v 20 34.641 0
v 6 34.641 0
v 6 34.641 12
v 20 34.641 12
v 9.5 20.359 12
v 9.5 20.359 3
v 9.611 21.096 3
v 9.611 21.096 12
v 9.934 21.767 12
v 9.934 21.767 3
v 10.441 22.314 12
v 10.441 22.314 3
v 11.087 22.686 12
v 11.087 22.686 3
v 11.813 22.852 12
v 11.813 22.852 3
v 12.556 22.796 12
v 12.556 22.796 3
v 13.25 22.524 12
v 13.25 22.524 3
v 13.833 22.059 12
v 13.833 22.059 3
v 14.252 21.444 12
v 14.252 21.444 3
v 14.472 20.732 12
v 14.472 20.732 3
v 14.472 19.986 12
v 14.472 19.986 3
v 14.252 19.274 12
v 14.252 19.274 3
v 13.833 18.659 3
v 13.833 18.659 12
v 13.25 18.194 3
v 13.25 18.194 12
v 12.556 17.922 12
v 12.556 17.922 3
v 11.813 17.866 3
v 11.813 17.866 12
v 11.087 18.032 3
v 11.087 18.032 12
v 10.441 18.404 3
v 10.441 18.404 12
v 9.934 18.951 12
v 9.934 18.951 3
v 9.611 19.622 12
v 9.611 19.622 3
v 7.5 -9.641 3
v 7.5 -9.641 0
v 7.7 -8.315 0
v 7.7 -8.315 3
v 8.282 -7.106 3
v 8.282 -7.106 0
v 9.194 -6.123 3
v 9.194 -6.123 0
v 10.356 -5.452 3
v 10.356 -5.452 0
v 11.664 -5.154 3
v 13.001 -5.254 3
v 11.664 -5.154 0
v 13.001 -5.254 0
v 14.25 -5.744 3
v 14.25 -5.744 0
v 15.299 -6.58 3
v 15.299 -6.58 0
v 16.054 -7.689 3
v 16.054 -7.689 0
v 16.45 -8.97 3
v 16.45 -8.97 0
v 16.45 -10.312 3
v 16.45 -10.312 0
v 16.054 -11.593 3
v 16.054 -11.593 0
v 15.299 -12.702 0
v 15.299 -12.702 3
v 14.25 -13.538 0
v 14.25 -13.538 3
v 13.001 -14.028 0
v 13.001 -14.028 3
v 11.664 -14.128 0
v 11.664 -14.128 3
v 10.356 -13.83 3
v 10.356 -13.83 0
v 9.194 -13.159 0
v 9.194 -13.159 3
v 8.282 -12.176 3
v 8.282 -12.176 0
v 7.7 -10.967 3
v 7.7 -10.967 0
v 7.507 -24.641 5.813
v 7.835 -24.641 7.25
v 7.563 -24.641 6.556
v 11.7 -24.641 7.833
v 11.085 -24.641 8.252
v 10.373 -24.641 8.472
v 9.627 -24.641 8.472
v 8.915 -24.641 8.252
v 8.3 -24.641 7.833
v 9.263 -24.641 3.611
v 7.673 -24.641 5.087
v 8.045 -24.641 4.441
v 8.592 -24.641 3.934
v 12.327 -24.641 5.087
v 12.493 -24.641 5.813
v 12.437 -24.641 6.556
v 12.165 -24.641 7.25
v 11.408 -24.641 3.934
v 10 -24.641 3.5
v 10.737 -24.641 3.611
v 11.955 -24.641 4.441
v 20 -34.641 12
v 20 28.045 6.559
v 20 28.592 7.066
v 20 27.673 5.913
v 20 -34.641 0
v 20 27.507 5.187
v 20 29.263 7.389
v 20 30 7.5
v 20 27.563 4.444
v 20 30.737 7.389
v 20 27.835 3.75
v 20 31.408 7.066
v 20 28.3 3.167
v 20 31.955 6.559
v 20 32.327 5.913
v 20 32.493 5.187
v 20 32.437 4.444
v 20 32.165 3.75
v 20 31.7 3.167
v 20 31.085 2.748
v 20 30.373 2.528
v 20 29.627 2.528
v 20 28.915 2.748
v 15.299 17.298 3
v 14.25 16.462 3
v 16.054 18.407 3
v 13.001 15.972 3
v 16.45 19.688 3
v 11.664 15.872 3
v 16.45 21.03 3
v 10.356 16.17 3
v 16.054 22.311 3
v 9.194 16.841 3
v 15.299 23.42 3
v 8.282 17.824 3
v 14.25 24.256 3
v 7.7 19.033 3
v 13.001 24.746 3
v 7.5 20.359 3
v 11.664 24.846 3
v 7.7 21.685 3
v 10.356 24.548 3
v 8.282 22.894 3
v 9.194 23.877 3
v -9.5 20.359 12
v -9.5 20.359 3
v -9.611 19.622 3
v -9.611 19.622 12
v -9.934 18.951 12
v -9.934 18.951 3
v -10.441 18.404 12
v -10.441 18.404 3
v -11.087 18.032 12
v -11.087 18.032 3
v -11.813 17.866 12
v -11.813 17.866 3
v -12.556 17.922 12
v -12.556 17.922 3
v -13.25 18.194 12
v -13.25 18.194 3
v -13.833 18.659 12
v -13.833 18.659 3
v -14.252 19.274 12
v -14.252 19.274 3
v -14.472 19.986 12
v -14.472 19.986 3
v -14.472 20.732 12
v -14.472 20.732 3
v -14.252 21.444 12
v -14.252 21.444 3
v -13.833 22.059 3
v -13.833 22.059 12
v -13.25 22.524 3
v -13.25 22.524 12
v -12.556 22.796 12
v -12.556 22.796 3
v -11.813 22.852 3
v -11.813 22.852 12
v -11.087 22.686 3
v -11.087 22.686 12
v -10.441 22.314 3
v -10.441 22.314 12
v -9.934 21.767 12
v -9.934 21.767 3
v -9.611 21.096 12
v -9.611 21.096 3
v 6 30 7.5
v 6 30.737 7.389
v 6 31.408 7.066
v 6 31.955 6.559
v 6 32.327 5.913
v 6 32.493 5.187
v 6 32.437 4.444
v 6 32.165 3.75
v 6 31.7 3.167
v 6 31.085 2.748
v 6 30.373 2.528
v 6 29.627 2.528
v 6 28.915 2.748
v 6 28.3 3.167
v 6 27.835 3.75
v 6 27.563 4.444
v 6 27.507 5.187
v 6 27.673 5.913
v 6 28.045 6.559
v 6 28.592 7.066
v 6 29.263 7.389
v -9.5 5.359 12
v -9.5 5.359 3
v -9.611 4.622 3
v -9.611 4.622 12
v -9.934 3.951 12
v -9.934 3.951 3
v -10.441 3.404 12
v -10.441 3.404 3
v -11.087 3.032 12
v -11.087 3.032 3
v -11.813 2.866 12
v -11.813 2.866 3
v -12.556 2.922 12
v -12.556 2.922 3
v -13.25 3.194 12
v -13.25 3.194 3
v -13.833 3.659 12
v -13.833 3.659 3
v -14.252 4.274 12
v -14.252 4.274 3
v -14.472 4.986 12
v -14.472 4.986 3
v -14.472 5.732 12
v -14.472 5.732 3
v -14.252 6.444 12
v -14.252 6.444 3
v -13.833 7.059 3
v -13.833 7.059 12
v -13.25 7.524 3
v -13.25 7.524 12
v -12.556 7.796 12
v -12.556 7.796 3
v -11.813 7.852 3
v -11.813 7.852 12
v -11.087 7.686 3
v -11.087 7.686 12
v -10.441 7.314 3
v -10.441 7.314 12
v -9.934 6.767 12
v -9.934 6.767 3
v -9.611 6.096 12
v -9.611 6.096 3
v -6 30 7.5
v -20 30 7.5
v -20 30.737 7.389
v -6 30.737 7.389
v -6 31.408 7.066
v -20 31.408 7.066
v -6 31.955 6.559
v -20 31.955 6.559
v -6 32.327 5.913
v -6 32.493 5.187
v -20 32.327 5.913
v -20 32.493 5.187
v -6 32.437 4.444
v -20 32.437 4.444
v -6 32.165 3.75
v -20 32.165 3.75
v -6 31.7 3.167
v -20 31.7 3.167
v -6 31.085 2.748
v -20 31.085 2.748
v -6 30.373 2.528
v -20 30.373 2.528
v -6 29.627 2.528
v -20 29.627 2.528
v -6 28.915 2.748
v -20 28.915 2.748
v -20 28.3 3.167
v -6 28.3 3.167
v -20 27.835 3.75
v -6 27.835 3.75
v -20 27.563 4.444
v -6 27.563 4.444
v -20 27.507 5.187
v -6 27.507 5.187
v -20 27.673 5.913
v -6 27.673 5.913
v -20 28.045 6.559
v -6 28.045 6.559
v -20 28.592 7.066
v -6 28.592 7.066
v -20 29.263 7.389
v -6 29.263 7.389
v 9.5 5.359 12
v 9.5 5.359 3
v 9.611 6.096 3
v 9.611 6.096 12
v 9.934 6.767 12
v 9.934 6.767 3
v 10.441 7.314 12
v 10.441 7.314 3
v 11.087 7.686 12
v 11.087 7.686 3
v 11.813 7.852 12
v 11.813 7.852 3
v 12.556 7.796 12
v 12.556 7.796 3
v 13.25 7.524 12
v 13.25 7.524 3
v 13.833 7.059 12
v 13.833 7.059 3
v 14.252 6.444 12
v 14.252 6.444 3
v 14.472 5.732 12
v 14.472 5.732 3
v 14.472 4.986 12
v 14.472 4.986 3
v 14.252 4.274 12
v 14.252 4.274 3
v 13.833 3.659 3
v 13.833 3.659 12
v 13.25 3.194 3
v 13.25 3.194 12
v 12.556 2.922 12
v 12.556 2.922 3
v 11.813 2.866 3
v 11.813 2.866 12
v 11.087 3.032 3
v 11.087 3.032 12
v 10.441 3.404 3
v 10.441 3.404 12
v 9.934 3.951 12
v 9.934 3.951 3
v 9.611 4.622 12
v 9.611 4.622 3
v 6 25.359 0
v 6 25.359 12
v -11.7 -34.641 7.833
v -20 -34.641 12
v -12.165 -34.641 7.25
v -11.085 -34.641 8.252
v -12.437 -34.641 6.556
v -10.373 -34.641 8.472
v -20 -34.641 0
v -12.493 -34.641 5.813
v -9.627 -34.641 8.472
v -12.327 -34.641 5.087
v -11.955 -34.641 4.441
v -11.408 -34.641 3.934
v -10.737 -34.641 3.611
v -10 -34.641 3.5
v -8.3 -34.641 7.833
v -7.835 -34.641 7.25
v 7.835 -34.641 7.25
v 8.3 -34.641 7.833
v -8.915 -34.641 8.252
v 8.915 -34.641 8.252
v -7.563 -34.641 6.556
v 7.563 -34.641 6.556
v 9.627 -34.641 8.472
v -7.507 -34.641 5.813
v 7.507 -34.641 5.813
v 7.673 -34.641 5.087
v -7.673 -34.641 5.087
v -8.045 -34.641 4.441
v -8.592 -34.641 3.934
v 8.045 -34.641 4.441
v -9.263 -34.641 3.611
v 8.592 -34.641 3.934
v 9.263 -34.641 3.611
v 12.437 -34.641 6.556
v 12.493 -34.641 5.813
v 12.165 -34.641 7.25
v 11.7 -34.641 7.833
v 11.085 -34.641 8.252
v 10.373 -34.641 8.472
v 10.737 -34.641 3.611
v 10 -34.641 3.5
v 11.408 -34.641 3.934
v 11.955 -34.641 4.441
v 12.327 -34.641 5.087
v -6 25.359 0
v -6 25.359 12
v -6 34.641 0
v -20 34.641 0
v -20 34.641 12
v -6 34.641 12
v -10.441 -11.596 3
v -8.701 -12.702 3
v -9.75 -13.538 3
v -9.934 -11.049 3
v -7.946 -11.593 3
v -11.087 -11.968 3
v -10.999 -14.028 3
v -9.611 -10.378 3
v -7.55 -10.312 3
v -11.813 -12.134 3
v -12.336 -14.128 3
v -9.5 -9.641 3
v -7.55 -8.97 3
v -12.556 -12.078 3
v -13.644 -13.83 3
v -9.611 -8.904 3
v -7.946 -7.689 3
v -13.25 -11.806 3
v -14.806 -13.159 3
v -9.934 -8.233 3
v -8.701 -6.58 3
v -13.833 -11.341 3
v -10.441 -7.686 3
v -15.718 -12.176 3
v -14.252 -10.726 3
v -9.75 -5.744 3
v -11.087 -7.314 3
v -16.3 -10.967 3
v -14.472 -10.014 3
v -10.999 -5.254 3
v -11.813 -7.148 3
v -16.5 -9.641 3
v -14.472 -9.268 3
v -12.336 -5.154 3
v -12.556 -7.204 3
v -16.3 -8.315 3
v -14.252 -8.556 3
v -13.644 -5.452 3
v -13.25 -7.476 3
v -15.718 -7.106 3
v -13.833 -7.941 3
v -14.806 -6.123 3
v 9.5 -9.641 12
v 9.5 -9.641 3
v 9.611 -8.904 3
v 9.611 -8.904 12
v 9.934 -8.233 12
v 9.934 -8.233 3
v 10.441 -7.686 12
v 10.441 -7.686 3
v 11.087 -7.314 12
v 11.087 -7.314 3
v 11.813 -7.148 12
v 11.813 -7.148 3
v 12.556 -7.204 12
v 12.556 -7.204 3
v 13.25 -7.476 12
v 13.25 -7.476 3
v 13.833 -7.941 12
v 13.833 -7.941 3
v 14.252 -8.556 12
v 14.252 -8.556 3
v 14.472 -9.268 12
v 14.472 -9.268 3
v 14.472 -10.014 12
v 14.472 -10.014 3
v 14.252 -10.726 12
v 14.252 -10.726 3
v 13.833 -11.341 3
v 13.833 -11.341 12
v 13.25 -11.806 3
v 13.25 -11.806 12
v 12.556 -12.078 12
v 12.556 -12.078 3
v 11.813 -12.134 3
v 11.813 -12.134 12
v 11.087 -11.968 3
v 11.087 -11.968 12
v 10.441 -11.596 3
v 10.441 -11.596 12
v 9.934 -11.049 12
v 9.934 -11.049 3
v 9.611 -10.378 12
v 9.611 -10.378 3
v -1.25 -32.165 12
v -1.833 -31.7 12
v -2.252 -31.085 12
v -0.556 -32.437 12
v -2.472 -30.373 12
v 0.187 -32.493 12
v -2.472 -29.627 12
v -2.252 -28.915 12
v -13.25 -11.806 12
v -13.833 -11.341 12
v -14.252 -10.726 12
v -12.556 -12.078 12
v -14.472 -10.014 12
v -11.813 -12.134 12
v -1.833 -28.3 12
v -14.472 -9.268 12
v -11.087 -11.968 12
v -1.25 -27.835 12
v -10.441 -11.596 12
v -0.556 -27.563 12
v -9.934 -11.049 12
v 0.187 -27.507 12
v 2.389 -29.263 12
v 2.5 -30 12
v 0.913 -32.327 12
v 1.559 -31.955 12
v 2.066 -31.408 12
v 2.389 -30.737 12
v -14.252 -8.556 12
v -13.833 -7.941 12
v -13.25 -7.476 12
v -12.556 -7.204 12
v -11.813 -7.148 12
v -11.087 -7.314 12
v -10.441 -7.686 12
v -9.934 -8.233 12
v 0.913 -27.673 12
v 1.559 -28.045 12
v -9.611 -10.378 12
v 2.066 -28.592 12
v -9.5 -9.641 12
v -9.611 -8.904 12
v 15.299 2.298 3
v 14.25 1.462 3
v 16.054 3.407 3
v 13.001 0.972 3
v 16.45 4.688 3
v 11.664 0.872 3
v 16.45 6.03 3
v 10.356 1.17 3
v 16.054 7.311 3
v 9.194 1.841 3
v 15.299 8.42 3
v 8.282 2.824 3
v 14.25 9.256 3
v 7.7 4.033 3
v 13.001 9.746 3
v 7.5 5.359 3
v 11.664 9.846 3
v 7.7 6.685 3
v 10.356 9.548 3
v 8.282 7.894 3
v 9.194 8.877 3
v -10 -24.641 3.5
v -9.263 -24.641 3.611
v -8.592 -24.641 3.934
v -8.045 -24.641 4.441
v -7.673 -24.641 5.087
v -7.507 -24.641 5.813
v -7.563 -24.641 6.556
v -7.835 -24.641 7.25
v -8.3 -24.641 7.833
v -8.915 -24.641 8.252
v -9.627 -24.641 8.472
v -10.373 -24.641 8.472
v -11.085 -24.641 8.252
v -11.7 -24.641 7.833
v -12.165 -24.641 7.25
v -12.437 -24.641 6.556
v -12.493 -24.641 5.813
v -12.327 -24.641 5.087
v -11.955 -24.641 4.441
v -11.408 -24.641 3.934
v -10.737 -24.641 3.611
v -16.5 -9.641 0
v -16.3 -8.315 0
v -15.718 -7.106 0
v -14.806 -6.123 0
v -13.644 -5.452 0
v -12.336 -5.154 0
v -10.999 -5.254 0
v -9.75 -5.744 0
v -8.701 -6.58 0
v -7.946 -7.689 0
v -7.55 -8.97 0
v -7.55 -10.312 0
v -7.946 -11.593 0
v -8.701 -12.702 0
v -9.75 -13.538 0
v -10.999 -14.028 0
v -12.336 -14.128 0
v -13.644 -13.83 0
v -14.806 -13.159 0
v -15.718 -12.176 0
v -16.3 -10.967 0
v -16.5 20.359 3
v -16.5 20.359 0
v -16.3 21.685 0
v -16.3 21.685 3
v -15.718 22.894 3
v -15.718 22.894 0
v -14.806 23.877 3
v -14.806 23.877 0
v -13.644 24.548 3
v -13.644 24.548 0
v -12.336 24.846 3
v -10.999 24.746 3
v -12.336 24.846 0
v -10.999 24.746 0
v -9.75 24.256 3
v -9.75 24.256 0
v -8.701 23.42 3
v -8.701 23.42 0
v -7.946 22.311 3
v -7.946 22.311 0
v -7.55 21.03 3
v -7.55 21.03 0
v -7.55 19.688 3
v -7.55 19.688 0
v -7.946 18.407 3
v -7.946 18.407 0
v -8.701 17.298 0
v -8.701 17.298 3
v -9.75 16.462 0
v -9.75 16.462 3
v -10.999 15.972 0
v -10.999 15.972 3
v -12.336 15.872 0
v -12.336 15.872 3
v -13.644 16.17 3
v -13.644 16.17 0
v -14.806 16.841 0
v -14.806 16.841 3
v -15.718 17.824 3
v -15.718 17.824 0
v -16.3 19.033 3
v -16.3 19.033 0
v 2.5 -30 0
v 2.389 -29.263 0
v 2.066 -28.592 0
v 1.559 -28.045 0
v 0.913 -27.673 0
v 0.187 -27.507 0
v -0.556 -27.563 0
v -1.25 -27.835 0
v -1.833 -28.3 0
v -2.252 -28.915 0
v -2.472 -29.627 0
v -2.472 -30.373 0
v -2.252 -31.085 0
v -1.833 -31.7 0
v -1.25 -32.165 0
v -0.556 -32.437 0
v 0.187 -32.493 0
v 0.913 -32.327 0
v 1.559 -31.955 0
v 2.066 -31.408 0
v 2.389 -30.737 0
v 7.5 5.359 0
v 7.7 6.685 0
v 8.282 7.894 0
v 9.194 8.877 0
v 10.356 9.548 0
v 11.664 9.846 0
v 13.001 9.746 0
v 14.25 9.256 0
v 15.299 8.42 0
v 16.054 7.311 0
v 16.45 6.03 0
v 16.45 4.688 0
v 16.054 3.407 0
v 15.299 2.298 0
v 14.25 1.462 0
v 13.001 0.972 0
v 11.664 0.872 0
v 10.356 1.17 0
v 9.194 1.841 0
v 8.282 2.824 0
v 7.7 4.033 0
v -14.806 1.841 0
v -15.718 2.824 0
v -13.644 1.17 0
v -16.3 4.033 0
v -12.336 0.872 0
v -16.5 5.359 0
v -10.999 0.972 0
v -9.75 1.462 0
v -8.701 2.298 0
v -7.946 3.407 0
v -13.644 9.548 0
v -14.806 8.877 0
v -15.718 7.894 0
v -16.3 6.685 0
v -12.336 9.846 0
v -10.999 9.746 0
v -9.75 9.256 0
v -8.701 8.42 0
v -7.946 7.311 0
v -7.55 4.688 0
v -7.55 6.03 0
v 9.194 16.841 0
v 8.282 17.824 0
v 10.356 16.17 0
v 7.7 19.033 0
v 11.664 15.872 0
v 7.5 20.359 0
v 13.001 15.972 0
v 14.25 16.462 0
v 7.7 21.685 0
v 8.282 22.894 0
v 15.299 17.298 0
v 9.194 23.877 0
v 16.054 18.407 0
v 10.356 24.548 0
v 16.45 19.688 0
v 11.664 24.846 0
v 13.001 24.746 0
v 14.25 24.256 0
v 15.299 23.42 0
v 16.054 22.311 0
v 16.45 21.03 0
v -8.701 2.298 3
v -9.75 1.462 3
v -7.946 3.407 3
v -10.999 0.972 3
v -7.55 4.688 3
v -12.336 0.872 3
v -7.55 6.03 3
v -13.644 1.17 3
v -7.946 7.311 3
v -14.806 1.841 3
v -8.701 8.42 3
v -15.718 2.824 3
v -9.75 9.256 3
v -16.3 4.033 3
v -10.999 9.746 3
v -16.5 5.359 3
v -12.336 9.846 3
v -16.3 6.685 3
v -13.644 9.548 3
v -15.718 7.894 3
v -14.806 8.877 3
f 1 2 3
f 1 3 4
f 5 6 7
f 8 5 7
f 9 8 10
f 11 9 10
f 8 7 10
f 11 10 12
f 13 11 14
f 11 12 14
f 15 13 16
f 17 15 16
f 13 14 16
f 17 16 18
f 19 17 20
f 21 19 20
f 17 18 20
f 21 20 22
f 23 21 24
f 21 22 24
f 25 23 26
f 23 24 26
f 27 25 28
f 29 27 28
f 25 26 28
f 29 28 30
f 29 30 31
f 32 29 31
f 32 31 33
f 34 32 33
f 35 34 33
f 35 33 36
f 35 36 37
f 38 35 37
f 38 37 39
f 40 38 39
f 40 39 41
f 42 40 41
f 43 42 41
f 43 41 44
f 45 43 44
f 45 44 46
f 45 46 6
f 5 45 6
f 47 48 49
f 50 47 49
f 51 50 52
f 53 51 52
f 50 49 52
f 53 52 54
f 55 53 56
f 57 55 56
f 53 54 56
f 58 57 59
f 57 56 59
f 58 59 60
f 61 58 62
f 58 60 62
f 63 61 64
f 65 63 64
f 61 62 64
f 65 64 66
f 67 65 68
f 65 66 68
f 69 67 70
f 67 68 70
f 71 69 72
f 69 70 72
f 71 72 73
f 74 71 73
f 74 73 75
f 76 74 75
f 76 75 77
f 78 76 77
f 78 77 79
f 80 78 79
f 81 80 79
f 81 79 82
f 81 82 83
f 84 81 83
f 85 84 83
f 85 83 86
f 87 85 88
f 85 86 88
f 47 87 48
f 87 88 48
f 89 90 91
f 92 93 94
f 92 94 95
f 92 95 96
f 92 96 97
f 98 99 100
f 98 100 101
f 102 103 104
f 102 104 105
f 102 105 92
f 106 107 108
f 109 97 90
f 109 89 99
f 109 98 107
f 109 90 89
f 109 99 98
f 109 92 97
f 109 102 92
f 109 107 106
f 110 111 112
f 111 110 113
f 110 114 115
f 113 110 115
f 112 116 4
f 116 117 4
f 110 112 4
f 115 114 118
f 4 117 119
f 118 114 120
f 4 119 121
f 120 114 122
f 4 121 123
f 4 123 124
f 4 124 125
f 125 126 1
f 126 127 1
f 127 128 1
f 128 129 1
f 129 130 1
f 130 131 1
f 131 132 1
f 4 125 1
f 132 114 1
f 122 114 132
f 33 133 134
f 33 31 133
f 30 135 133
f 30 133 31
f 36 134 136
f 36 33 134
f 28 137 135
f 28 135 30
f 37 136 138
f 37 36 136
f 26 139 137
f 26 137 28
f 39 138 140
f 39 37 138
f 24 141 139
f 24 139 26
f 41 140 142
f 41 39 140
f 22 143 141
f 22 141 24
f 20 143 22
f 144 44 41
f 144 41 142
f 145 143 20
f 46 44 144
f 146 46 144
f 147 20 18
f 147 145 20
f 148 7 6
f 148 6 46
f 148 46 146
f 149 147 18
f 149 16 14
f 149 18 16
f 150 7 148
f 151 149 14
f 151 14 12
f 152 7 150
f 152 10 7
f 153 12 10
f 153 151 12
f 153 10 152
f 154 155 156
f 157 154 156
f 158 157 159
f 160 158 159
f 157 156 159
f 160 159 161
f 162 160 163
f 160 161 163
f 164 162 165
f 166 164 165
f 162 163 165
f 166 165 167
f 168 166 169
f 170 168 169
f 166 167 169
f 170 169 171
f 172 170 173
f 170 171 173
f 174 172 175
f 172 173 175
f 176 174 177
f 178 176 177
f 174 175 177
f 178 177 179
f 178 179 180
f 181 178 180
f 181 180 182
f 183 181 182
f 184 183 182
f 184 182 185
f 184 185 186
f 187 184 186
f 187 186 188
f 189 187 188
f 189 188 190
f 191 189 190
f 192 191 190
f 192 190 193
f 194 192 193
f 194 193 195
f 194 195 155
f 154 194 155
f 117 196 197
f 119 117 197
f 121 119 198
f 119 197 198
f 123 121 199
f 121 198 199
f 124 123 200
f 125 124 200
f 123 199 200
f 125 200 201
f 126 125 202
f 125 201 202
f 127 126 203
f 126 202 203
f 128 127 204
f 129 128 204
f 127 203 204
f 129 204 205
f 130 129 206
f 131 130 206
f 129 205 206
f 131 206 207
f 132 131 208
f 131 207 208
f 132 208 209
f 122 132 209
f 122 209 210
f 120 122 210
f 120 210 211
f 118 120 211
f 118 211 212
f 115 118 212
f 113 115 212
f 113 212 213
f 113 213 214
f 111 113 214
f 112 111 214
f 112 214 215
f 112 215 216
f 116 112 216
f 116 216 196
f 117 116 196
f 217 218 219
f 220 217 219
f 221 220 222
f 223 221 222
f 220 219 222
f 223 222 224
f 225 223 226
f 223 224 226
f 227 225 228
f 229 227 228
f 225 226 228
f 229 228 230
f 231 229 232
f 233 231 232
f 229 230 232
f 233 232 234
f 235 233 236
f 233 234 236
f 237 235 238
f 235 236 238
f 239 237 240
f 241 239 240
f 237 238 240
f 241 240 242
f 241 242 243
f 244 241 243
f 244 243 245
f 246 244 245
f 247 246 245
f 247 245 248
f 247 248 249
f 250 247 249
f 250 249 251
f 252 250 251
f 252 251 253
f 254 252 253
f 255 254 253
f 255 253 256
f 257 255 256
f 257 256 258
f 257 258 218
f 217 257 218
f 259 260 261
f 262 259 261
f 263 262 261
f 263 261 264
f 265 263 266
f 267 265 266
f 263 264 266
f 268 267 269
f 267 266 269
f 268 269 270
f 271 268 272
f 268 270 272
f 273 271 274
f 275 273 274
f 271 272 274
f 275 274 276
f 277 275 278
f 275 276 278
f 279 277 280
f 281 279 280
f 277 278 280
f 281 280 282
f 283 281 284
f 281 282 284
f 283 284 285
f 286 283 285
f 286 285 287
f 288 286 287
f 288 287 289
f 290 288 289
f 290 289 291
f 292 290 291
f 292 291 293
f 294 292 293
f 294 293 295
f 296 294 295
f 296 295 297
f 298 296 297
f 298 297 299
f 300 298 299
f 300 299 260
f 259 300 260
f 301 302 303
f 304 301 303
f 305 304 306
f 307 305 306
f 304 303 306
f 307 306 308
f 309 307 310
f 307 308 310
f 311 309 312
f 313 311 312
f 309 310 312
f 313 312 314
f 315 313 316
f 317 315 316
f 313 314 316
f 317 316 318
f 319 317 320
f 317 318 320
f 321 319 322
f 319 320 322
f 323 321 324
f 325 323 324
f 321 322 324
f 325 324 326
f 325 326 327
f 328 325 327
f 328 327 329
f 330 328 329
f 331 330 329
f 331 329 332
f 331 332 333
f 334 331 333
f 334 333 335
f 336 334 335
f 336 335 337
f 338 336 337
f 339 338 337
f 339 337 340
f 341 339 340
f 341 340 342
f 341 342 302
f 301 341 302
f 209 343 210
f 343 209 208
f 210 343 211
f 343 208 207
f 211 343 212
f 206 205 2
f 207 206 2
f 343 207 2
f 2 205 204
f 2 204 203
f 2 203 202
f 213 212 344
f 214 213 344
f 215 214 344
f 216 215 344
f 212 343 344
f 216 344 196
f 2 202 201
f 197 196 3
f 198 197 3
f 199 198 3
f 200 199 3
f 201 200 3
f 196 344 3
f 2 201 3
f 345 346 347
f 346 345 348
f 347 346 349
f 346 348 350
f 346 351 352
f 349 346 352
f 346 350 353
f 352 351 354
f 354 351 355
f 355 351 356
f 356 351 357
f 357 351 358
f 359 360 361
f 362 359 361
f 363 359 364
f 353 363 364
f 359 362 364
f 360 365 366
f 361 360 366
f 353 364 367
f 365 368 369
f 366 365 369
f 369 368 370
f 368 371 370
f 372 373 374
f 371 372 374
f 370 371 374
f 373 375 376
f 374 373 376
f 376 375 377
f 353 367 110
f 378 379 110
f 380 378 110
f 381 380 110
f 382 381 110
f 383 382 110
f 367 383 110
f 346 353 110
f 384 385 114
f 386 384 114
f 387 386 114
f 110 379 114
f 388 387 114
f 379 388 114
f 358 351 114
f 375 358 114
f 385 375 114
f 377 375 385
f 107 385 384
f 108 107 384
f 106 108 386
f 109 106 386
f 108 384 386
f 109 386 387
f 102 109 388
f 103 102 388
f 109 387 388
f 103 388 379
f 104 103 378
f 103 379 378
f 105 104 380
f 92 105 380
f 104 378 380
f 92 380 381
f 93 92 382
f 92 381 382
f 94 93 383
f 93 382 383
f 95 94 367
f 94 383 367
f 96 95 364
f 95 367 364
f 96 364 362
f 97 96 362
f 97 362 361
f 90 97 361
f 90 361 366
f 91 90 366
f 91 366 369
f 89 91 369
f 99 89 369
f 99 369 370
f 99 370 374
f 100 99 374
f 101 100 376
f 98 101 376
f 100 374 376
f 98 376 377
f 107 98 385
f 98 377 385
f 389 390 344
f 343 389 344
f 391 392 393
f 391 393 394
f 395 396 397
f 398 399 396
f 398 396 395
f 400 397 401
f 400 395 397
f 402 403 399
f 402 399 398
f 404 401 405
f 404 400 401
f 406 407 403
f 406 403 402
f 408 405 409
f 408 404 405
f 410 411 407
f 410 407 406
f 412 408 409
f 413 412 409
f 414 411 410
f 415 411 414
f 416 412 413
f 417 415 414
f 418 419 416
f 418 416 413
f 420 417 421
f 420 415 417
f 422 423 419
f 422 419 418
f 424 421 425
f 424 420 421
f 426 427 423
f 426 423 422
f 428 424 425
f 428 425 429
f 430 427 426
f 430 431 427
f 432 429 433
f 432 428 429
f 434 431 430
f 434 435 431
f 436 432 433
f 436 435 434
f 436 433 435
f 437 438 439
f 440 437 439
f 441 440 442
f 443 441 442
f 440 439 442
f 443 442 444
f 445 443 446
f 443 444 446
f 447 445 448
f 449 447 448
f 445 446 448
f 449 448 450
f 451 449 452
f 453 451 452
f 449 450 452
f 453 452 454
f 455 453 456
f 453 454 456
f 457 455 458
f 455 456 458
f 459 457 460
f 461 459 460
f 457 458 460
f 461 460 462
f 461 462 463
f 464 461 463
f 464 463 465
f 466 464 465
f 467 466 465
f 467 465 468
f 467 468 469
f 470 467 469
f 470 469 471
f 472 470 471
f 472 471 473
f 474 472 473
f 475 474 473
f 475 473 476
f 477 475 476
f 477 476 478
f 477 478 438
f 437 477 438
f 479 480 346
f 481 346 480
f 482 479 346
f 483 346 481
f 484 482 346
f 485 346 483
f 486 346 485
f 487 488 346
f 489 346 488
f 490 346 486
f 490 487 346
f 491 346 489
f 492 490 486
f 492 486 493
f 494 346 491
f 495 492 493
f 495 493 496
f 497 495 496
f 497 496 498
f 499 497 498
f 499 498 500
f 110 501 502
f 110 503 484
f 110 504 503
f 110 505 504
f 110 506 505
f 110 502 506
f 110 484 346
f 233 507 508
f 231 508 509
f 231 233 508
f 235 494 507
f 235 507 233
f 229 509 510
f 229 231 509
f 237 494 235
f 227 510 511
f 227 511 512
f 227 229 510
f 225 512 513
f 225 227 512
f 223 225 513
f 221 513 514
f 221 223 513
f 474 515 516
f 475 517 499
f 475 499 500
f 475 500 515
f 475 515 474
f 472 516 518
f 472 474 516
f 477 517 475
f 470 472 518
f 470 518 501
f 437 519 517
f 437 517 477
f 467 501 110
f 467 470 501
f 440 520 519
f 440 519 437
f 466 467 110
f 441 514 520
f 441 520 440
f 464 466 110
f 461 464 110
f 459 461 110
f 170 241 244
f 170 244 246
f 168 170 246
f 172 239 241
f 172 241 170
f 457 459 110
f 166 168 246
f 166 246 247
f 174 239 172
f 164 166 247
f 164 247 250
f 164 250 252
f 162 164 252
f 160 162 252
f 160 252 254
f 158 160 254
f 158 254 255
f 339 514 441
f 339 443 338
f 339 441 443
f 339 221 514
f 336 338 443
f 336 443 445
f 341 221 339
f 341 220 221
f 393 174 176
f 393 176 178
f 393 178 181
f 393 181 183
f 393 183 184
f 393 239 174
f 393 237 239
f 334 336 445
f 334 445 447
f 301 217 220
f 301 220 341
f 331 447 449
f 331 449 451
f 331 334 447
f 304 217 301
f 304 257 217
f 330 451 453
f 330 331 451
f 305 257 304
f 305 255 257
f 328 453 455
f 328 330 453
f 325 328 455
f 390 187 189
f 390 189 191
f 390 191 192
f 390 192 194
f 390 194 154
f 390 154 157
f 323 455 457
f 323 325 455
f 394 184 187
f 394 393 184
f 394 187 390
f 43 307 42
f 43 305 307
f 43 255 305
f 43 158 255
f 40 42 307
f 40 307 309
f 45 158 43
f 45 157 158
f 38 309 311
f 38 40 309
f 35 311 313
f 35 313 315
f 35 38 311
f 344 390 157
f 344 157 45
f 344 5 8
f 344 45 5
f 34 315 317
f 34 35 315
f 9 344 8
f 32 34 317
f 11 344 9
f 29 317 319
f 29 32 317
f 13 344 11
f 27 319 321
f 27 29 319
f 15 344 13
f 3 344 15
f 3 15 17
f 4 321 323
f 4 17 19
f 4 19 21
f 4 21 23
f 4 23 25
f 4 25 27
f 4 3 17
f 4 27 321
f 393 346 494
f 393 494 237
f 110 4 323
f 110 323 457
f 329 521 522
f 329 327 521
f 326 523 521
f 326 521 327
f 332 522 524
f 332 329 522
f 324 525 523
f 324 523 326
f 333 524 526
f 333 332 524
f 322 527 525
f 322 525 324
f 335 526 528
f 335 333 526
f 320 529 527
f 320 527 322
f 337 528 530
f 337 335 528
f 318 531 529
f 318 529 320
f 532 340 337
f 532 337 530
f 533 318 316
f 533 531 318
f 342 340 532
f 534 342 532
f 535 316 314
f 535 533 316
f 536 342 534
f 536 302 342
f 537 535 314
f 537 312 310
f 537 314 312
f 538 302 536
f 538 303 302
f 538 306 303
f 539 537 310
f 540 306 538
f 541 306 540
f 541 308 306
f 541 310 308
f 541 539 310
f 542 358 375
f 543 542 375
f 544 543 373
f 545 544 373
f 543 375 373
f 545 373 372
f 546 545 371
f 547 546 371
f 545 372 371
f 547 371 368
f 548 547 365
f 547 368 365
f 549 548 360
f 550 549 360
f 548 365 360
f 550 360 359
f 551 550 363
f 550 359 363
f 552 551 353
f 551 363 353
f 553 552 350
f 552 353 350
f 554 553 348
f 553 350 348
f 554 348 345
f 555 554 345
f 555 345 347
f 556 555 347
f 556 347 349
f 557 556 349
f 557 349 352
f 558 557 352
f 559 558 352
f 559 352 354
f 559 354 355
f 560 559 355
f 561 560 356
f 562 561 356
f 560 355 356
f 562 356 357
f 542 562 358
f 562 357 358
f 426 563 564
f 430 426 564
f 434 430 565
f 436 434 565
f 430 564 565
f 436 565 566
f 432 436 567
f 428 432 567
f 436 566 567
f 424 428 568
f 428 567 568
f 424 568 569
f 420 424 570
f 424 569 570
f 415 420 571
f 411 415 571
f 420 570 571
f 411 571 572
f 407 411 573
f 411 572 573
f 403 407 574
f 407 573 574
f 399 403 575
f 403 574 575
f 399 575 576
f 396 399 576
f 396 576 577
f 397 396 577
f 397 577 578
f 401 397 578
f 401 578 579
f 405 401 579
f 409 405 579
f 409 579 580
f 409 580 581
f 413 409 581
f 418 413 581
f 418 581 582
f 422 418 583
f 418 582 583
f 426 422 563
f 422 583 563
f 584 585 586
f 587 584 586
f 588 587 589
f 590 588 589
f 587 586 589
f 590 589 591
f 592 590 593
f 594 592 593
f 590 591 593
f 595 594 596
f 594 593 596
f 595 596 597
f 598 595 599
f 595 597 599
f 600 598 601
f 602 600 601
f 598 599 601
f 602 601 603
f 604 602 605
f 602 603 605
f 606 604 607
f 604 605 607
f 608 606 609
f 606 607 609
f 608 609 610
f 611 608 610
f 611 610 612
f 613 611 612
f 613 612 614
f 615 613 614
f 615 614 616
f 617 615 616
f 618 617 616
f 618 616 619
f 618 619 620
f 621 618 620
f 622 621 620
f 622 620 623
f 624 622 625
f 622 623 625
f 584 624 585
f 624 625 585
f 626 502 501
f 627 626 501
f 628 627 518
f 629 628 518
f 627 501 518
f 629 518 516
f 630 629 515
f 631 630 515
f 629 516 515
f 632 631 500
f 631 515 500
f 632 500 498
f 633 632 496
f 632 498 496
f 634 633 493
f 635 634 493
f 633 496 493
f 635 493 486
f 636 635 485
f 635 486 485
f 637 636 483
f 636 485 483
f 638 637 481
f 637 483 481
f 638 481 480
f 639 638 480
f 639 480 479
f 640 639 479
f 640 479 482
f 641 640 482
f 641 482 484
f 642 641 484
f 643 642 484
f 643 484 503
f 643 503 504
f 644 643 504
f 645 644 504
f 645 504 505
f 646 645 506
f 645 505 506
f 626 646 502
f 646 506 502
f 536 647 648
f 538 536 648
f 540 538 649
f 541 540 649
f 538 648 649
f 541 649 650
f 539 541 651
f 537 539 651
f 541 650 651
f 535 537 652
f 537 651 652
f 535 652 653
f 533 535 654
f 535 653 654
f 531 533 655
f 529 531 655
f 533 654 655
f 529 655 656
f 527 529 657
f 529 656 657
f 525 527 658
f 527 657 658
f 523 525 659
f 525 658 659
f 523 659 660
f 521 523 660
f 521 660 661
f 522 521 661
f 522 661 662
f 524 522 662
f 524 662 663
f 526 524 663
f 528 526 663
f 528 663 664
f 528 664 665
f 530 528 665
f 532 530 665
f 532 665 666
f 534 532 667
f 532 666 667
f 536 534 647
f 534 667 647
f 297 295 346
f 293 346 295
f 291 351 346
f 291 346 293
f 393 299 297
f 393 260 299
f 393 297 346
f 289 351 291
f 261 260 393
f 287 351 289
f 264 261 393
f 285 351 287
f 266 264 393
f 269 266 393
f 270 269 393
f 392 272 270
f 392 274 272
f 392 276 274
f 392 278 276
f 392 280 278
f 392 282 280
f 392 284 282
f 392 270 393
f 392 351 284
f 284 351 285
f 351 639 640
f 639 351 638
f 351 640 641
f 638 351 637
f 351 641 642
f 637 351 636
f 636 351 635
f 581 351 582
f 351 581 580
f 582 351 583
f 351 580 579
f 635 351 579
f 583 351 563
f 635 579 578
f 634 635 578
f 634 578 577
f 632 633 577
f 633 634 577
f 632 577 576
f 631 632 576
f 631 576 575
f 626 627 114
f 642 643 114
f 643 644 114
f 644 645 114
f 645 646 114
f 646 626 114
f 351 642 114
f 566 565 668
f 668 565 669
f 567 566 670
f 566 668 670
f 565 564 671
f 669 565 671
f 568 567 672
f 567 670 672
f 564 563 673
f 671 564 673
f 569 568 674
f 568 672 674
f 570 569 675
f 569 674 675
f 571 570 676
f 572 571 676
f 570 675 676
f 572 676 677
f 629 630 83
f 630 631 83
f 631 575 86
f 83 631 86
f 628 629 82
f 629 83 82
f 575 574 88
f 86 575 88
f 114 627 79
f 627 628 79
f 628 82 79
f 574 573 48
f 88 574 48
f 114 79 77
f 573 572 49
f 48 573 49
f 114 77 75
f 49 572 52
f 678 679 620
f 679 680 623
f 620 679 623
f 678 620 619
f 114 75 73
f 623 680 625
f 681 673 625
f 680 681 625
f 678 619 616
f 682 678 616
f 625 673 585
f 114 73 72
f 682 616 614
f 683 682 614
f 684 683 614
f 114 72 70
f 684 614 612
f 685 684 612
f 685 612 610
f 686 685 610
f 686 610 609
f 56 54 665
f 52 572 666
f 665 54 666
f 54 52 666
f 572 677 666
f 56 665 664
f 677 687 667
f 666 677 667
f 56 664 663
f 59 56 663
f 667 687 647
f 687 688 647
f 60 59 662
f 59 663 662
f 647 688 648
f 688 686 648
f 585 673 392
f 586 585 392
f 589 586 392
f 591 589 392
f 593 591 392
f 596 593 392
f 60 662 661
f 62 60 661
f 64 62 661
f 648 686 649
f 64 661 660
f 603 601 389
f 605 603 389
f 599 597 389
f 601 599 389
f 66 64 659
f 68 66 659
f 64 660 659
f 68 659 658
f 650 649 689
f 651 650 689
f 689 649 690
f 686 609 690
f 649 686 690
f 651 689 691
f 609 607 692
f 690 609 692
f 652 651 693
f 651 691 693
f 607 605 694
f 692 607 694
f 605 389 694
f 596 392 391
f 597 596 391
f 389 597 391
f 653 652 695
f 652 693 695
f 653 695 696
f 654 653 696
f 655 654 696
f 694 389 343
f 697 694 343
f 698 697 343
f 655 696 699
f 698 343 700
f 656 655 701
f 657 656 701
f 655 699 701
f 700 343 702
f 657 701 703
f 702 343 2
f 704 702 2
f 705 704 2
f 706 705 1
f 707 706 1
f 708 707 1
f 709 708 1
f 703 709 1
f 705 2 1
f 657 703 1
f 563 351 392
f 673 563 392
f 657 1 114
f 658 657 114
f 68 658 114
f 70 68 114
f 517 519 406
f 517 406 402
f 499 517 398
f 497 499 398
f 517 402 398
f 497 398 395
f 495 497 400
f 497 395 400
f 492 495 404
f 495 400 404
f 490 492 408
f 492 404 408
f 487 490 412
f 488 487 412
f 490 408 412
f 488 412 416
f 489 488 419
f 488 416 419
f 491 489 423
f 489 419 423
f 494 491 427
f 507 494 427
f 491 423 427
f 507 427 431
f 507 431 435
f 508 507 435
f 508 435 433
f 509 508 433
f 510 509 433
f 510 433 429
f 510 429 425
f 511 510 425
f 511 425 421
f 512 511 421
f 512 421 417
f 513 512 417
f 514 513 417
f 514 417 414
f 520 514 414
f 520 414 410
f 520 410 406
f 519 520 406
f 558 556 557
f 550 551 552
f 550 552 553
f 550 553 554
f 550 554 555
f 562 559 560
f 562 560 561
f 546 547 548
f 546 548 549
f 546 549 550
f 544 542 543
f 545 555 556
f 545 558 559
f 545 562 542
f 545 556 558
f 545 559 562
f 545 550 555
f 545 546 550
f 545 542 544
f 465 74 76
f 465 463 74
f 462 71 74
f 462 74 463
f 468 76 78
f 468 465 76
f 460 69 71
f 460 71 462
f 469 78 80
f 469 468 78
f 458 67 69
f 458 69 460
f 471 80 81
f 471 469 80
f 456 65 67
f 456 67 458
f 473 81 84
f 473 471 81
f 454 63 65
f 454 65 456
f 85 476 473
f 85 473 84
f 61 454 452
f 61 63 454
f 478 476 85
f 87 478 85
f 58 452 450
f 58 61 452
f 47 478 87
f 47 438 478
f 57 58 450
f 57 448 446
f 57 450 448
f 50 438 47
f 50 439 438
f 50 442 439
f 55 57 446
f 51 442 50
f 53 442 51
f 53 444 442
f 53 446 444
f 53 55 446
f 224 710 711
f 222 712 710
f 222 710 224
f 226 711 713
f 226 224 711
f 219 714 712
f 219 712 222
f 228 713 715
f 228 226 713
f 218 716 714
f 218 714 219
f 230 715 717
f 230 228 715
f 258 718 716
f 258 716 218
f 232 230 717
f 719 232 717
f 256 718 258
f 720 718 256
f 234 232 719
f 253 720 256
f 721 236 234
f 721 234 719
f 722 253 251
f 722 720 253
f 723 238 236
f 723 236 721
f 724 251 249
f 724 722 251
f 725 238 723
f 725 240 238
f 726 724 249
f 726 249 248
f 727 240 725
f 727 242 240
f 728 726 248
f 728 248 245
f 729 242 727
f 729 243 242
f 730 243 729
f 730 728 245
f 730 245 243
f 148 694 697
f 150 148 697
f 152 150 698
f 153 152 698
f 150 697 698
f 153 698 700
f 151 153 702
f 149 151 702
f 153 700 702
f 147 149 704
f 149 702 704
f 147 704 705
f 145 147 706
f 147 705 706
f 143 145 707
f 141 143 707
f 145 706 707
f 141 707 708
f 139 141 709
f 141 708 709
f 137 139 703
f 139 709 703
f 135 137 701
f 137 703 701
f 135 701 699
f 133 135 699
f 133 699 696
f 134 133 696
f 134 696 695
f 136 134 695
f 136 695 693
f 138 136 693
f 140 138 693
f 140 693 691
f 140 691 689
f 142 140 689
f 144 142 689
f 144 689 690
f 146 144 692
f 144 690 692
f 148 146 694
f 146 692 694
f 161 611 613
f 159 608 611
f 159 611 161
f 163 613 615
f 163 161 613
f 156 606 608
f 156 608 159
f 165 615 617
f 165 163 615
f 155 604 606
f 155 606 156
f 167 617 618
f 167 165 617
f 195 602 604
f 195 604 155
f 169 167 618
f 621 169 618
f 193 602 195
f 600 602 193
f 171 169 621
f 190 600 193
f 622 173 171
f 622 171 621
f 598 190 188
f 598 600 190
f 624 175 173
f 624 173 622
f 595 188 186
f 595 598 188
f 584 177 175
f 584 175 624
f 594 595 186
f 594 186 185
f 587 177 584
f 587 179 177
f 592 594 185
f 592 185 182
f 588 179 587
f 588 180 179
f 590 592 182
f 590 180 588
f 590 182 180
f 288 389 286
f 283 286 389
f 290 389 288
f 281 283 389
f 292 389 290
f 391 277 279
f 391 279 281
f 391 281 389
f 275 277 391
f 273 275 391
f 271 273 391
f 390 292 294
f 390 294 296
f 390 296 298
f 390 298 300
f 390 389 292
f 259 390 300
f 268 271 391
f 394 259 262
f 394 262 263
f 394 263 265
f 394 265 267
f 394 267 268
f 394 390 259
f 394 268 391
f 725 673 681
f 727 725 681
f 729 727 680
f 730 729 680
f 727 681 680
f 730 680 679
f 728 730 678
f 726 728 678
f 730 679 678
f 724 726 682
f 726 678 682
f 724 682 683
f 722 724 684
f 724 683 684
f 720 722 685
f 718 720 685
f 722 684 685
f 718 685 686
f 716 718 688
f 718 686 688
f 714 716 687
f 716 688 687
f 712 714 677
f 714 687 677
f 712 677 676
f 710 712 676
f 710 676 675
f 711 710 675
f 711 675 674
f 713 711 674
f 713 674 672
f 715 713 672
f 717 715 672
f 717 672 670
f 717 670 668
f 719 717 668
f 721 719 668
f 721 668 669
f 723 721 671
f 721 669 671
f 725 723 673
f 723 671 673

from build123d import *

# Parameters (mm, degrees)
SKETCH_1_W          = 40
SKETCH_1_H          = 69.282032302
EXTRUDE_1_DEPTH     = 12
SKETCH_2_R          = 2.5
SKETCH_2_W          = 12
SKETCH_2_H          = 9.282032302
CUT_EXTRUDE_1_DEPTH = 12
SKETCH_3_R          = 2.5
CUT_EXTRUDE_2_DEPTH = 60
SKETCH_4_R          = 2.5
CUT_EXTRUDE_3_DEPTH = 12
SKETCH_5_R          = 4.5
CUT_EXTRUDE_4_DEPTH = 3
SKETCH_6_R          = 2.5
CUT_EXTRUDE_5_DEPTH = 10


with BuildPart() as part:
    # 草图1 → 凸台-拉伸1 (new body)
    with BuildSketch(Plane.XY):
        Rectangle(SKETCH_1_W, SKETCH_1_H)
    extrude(amount=EXTRUDE_1_DEPTH)

    # 草图2 → 切除-拉伸1 (cut)
    with BuildSketch(Plane.XY.offset(12)):
        with Locations((0, -30)):
            Circle(SKETCH_2_R)
        with Locations((0, 30)):
            Rectangle(SKETCH_2_W, SKETCH_2_H)
    extrude(amount=-CUT_EXTRUDE_1_DEPTH, mode=Mode.SUBTRACT)

    # 草图3 → 切除-拉伸2 (cut)
    with BuildSketch(Plane.ZY.offset(20)):
        with Locations((5, 30)):
            Circle(SKETCH_3_R)
    extrude(amount=-CUT_EXTRUDE_2_DEPTH, mode=Mode.SUBTRACT)

    # 草图4 → 切除-拉伸3 (cut)
    with BuildSketch(Plane(origin=(0, 0, 0), x_dir=(-1, 0, 0), z_dir=(0, 0, -1))):
        with Locations((-12, -9.641016151)):
            Circle(SKETCH_4_R)
        with Locations((-12, 5.358983849)):
            Circle(SKETCH_4_R)
        with Locations((-12, 20.358983849)):
            Circle(SKETCH_4_R)
        with Locations(Location((12, 20.358983849, 0), (0, 0, 180))):
            Circle(SKETCH_4_R)
        with Locations(Location((12, 5.358983849, 0), (0, 0, 180))):
            Circle(SKETCH_4_R)
        with Locations(Location((12, -9.641016151, 0), (0, 0, 180))):
            Circle(SKETCH_4_R)
    extrude(amount=-CUT_EXTRUDE_3_DEPTH, mode=Mode.SUBTRACT)

    # 草图5 → 切除-拉伸4 (cut)
    with BuildSketch(Plane(origin=(0, 0, 0), x_dir=(-1, 0, 0), z_dir=(0, 0, -1))):
        with Locations((-12, -9.641016151)):
            Circle(SKETCH_5_R)
        with Locations((-12, 5.358983849)):
            Circle(SKETCH_5_R)
        with Locations((-12, 20.358983849)):
            Circle(SKETCH_5_R)
        with Locations((12, -9.641016151)):
            Circle(SKETCH_5_R)
        with Locations((12, 5.358983849)):
            Circle(SKETCH_5_R)
        with Locations((12, 20.358983849)):
            Circle(SKETCH_5_R)
    extrude(amount=-CUT_EXTRUDE_4_DEPTH, mode=Mode.SUBTRACT)

    # 草图6 → 切除-拉伸5 (cut)
    with BuildSketch(Plane.XZ.offset(34.641016151)):
        with Locations(Location((-10, 6, 0), (0, 0, 270))):
            Circle(SKETCH_6_R)
        with Locations(Location((10, 6, 0), (0, 0, 270))):
            Circle(SKETCH_6_R)
    extrude(amount=-CUT_EXTRUDE_5_DEPTH, mode=Mode.SUBTRACT)


solid = part.part
